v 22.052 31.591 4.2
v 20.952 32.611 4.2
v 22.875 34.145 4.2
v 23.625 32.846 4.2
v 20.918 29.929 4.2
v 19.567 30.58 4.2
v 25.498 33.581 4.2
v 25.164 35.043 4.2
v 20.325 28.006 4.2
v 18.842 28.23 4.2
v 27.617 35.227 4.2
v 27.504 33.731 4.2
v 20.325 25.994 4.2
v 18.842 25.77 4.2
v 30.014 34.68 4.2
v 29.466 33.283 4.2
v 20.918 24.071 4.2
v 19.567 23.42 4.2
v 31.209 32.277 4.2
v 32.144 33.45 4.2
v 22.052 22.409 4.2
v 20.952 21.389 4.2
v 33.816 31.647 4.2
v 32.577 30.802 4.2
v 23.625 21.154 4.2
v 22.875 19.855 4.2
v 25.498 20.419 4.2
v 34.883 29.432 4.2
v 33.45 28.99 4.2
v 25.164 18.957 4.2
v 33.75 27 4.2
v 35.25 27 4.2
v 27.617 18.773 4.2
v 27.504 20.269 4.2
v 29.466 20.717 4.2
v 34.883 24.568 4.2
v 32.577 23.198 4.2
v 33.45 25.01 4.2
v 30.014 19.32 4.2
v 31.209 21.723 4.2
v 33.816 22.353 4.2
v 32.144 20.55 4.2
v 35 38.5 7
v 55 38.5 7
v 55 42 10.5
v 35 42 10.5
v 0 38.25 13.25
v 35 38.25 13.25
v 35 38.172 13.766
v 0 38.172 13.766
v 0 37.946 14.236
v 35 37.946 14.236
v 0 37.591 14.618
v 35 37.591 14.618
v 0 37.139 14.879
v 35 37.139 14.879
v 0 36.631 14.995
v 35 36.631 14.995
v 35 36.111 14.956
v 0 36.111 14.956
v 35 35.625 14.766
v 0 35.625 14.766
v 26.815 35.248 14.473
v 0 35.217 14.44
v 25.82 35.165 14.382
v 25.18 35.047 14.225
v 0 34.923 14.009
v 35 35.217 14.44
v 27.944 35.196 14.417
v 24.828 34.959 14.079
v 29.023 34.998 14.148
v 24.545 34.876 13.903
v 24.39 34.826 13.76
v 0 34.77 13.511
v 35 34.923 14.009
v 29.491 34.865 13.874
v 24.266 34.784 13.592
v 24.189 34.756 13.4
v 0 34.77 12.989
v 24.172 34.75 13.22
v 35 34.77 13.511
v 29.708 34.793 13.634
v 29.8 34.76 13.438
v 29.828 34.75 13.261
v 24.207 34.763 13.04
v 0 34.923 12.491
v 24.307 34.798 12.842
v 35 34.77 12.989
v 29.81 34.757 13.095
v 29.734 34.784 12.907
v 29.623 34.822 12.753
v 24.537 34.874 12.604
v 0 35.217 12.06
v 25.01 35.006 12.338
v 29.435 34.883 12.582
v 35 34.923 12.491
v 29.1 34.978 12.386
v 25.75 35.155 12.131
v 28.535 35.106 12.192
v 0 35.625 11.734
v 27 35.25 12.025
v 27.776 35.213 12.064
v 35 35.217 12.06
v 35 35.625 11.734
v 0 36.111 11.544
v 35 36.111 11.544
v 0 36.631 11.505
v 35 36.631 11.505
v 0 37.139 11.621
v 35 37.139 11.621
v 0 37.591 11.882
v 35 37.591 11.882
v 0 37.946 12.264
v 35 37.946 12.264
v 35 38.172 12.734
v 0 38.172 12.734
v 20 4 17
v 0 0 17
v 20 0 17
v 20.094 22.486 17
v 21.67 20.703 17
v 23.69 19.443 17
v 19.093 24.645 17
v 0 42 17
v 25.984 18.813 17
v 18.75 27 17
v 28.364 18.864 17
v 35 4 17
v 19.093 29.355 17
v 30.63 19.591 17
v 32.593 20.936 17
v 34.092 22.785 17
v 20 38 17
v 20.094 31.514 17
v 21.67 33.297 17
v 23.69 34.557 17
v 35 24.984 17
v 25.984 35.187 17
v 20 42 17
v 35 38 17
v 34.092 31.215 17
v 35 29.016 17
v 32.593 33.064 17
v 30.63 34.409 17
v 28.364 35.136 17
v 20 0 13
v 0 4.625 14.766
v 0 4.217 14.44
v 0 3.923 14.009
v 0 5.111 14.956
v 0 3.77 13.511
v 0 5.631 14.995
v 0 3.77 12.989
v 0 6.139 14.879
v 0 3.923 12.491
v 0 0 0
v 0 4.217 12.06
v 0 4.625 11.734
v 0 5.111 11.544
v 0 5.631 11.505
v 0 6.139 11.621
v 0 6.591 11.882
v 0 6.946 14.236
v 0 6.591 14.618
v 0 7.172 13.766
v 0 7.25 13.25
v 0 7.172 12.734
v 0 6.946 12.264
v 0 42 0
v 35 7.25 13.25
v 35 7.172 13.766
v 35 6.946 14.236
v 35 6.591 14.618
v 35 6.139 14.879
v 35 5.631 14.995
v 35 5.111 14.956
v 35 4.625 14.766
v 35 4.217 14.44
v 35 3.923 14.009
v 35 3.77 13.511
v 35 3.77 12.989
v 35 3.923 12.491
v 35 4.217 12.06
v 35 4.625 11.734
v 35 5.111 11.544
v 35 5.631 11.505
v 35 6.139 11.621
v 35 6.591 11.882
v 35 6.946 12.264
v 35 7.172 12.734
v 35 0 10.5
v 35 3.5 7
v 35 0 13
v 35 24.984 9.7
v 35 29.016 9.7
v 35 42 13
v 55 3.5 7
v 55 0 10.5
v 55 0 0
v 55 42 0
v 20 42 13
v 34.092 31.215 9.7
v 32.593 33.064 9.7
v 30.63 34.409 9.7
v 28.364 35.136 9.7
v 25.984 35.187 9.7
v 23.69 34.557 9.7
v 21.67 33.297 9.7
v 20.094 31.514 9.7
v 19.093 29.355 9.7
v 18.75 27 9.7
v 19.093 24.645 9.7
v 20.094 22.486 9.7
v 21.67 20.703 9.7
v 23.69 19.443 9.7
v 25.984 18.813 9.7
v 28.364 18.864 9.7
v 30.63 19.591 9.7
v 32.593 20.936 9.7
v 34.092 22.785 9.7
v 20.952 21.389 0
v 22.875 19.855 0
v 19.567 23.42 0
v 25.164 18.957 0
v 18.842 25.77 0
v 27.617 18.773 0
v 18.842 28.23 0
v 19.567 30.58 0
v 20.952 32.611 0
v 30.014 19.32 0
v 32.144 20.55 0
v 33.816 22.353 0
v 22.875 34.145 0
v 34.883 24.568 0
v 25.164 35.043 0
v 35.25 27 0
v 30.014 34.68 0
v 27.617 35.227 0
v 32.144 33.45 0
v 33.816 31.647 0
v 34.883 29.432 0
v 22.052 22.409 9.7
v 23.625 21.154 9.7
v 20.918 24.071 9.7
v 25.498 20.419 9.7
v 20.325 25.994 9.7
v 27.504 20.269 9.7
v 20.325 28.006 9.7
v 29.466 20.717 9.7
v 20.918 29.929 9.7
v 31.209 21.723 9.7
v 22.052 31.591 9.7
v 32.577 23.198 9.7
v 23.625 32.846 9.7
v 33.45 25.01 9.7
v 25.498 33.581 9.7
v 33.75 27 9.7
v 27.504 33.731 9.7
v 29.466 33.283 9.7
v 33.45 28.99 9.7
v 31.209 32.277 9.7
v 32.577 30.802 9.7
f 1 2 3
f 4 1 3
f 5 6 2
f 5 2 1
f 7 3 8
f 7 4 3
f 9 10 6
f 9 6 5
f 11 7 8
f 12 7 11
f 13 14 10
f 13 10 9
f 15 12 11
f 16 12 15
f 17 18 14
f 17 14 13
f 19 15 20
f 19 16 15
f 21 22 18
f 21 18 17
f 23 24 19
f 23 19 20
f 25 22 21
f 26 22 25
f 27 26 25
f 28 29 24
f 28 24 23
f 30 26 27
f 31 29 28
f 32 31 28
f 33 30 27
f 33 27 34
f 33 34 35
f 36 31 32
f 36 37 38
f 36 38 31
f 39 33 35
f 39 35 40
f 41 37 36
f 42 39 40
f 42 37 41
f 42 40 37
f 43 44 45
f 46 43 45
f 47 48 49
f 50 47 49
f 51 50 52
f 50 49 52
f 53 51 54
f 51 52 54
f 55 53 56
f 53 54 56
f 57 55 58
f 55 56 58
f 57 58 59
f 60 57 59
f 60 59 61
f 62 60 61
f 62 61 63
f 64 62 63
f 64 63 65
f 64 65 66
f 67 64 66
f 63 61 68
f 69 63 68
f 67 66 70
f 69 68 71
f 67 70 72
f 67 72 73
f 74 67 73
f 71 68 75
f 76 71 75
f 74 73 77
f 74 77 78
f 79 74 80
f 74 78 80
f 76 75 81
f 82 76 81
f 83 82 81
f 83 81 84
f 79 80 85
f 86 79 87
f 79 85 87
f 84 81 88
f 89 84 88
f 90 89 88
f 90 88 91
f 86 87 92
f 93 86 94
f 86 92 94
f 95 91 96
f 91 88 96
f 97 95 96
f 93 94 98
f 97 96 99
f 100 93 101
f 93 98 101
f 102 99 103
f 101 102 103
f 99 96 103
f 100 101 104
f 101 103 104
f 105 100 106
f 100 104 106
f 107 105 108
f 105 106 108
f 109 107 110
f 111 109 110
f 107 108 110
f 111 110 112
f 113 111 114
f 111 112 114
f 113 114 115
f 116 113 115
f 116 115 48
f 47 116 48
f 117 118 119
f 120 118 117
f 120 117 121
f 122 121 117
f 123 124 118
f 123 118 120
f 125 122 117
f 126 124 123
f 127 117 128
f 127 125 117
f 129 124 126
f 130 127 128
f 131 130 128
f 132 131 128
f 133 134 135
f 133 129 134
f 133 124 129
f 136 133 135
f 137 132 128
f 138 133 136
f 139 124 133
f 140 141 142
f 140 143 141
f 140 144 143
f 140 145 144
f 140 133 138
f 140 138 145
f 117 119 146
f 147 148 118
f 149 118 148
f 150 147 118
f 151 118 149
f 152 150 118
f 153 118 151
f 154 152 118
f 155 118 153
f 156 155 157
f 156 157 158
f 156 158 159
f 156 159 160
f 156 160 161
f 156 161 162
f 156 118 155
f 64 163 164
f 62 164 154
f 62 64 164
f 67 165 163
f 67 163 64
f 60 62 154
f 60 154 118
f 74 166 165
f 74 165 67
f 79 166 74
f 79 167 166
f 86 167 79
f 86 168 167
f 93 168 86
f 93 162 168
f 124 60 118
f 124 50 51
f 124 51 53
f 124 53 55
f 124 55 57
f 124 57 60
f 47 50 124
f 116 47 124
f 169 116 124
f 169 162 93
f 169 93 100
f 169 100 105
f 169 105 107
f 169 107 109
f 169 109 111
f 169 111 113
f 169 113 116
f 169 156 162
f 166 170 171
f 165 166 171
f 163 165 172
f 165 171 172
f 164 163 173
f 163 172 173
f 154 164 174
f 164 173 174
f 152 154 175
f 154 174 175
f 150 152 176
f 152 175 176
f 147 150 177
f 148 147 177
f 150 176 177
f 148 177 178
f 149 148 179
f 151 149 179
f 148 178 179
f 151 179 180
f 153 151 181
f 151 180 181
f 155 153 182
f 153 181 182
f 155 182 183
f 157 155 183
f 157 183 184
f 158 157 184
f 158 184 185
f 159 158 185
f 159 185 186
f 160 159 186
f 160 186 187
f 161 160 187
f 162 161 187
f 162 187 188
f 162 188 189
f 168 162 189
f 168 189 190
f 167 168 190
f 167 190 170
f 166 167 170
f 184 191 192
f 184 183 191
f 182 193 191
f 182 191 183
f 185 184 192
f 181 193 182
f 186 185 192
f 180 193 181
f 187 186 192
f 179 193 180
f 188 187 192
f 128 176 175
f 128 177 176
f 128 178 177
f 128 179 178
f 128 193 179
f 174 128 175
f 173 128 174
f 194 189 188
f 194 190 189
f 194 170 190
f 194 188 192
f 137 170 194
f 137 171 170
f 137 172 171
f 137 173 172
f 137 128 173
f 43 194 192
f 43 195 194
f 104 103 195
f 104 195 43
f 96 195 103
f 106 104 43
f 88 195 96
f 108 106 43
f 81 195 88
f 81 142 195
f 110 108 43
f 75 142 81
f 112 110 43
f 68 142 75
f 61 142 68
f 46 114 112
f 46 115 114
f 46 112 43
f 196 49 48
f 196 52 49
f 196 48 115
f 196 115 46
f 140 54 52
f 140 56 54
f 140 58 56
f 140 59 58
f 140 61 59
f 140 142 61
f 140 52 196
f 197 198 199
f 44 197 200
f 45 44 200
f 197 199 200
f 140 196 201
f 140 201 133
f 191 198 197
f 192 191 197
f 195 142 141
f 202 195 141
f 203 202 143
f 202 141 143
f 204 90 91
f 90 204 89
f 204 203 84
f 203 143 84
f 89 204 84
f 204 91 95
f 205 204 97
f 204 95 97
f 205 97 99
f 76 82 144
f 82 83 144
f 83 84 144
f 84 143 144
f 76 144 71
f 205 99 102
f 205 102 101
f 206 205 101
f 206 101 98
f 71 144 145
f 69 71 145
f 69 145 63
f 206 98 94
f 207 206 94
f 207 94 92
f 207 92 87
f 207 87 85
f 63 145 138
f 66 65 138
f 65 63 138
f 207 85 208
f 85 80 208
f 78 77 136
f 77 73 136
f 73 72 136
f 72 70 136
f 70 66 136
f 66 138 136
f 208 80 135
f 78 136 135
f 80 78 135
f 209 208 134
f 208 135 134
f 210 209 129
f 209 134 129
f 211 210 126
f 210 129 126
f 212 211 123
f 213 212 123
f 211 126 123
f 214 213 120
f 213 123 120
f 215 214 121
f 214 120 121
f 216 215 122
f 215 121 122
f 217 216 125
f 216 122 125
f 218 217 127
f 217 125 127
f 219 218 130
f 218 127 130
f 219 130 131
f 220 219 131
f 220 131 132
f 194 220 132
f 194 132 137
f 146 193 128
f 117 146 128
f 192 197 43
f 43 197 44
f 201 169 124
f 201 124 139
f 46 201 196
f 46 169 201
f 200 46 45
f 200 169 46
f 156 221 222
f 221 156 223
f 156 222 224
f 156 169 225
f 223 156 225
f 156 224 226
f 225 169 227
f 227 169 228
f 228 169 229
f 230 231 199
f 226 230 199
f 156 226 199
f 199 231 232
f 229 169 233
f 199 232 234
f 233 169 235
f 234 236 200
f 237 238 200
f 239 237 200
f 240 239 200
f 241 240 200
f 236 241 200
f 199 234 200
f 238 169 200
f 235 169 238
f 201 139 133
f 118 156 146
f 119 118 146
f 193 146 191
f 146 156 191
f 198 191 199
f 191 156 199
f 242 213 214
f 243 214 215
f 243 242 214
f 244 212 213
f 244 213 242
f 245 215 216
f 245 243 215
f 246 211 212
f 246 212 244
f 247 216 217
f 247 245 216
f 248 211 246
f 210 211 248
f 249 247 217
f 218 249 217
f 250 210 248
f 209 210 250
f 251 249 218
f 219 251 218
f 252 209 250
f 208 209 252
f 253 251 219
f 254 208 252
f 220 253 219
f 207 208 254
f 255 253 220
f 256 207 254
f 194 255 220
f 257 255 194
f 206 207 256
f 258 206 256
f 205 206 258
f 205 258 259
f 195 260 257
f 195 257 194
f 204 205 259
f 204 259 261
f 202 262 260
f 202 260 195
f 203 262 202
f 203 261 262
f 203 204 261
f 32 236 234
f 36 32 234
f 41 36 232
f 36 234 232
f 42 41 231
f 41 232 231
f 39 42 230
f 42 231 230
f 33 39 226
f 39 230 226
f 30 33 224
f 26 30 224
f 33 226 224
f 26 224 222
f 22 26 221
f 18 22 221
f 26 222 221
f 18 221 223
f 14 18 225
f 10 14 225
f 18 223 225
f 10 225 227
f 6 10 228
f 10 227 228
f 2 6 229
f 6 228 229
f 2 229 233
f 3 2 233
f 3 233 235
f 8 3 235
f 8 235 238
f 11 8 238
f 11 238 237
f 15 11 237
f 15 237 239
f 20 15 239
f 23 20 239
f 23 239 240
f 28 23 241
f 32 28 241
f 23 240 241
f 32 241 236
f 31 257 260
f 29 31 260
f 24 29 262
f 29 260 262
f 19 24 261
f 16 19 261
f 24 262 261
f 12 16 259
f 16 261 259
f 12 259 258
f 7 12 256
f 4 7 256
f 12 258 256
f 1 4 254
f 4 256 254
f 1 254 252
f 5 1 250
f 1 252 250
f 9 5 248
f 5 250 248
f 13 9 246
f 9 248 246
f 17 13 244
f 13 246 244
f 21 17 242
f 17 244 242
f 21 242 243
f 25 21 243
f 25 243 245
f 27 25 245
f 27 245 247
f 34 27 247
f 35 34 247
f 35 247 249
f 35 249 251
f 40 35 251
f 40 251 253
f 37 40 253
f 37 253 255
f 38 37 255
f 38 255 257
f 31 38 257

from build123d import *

# Parameters (mm, degrees)
BOX_W           = 55
BOX_H           = 42
BOX_DEPTH       = 17
SKETCH_R        = 1.75
POCKET_DEPTH    = 55.001
POCKET001_DEPTH = 35
POCKET002_DEPTH = 20
SKETCH003_R     = 6.75
POCKET003_DEPTH = 17.001
SKETCH004_R     = 8.25
POCKET004_DEPTH = 7.3
SKETCH005_R     = 8.25
POCKET005_DEPTH = 4.2


with BuildPart() as part:
    # Box → Box (new body)
    with BuildSketch(Plane.XY):
        with Locations((27.5, 21)):
            Rectangle(BOX_W, BOX_H)
    extrude(amount=BOX_DEPTH)

    # Sketch (on Face2 of BaseFeature) → Pocket (cut, through all)
    with BuildSketch(Plane.YZ.offset(55)):
        with Locations((5.5, 13.25)):
            Circle(SKETCH_R)
        with Locations((36.5, 13.25)):
            Circle(SKETCH_R)
    extrude(amount=-POCKET_DEPTH, mode=Mode.SUBTRACT)

    # Sketch001 (on Face2 of BaseFeature) → Pocket001 (cut)
    with BuildSketch(Plane.YZ.offset(55)):
        Polygon((4, 17), (0, 17), (0, 13), align=None)
        Polygon((38, 17), (42, 17), (42, 13), align=None)
    extrude(amount=-POCKET001_DEPTH, mode=Mode.SUBTRACT)

    # Sketch002 (on Face8 of Pocket001) → Pocket002 (cut)
    with BuildSketch(Plane.YZ.offset(55)):
        Polygon((4, 17), (0, 13), (0, 10.5), (3.5, 7), (38.5, 7), (42, 10.5), (42, 13), (38, 17), align=None)
    extrude(amount=-POCKET002_DEPTH, mode=Mode.SUBTRACT)

    # Sketch003 (on Face3 of Pocket002) → Pocket003 (cut, through all)
    with BuildSketch(Plane.XY.offset(17)):
        with Locations((27, 27)):
            Circle(SKETCH003_R)
    extrude(amount=-POCKET003_DEPTH, mode=Mode.SUBTRACT)

    # Sketch004 (on Face3 of Pocket003) → Pocket004 (cut)
    with BuildSketch(Plane.XY.offset(17)):
        with Locations((27, 27)):
            Circle(SKETCH004_R)
    extrude(amount=-POCKET004_DEPTH, mode=Mode.SUBTRACT)

    # Sketch005 (on Face4 of Pocket004) → Pocket005 (cut)
    with BuildSketch(Plane(origin=(0, 0, 0), x_dir=(1, 0, 0), z_dir=(0, 0, -1))):
        with Locations((27, -27)):
            Circle(SKETCH005_R)
    extrude(amount=-POCKET005_DEPTH, mode=Mode.SUBTRACT)


solid = part.part
